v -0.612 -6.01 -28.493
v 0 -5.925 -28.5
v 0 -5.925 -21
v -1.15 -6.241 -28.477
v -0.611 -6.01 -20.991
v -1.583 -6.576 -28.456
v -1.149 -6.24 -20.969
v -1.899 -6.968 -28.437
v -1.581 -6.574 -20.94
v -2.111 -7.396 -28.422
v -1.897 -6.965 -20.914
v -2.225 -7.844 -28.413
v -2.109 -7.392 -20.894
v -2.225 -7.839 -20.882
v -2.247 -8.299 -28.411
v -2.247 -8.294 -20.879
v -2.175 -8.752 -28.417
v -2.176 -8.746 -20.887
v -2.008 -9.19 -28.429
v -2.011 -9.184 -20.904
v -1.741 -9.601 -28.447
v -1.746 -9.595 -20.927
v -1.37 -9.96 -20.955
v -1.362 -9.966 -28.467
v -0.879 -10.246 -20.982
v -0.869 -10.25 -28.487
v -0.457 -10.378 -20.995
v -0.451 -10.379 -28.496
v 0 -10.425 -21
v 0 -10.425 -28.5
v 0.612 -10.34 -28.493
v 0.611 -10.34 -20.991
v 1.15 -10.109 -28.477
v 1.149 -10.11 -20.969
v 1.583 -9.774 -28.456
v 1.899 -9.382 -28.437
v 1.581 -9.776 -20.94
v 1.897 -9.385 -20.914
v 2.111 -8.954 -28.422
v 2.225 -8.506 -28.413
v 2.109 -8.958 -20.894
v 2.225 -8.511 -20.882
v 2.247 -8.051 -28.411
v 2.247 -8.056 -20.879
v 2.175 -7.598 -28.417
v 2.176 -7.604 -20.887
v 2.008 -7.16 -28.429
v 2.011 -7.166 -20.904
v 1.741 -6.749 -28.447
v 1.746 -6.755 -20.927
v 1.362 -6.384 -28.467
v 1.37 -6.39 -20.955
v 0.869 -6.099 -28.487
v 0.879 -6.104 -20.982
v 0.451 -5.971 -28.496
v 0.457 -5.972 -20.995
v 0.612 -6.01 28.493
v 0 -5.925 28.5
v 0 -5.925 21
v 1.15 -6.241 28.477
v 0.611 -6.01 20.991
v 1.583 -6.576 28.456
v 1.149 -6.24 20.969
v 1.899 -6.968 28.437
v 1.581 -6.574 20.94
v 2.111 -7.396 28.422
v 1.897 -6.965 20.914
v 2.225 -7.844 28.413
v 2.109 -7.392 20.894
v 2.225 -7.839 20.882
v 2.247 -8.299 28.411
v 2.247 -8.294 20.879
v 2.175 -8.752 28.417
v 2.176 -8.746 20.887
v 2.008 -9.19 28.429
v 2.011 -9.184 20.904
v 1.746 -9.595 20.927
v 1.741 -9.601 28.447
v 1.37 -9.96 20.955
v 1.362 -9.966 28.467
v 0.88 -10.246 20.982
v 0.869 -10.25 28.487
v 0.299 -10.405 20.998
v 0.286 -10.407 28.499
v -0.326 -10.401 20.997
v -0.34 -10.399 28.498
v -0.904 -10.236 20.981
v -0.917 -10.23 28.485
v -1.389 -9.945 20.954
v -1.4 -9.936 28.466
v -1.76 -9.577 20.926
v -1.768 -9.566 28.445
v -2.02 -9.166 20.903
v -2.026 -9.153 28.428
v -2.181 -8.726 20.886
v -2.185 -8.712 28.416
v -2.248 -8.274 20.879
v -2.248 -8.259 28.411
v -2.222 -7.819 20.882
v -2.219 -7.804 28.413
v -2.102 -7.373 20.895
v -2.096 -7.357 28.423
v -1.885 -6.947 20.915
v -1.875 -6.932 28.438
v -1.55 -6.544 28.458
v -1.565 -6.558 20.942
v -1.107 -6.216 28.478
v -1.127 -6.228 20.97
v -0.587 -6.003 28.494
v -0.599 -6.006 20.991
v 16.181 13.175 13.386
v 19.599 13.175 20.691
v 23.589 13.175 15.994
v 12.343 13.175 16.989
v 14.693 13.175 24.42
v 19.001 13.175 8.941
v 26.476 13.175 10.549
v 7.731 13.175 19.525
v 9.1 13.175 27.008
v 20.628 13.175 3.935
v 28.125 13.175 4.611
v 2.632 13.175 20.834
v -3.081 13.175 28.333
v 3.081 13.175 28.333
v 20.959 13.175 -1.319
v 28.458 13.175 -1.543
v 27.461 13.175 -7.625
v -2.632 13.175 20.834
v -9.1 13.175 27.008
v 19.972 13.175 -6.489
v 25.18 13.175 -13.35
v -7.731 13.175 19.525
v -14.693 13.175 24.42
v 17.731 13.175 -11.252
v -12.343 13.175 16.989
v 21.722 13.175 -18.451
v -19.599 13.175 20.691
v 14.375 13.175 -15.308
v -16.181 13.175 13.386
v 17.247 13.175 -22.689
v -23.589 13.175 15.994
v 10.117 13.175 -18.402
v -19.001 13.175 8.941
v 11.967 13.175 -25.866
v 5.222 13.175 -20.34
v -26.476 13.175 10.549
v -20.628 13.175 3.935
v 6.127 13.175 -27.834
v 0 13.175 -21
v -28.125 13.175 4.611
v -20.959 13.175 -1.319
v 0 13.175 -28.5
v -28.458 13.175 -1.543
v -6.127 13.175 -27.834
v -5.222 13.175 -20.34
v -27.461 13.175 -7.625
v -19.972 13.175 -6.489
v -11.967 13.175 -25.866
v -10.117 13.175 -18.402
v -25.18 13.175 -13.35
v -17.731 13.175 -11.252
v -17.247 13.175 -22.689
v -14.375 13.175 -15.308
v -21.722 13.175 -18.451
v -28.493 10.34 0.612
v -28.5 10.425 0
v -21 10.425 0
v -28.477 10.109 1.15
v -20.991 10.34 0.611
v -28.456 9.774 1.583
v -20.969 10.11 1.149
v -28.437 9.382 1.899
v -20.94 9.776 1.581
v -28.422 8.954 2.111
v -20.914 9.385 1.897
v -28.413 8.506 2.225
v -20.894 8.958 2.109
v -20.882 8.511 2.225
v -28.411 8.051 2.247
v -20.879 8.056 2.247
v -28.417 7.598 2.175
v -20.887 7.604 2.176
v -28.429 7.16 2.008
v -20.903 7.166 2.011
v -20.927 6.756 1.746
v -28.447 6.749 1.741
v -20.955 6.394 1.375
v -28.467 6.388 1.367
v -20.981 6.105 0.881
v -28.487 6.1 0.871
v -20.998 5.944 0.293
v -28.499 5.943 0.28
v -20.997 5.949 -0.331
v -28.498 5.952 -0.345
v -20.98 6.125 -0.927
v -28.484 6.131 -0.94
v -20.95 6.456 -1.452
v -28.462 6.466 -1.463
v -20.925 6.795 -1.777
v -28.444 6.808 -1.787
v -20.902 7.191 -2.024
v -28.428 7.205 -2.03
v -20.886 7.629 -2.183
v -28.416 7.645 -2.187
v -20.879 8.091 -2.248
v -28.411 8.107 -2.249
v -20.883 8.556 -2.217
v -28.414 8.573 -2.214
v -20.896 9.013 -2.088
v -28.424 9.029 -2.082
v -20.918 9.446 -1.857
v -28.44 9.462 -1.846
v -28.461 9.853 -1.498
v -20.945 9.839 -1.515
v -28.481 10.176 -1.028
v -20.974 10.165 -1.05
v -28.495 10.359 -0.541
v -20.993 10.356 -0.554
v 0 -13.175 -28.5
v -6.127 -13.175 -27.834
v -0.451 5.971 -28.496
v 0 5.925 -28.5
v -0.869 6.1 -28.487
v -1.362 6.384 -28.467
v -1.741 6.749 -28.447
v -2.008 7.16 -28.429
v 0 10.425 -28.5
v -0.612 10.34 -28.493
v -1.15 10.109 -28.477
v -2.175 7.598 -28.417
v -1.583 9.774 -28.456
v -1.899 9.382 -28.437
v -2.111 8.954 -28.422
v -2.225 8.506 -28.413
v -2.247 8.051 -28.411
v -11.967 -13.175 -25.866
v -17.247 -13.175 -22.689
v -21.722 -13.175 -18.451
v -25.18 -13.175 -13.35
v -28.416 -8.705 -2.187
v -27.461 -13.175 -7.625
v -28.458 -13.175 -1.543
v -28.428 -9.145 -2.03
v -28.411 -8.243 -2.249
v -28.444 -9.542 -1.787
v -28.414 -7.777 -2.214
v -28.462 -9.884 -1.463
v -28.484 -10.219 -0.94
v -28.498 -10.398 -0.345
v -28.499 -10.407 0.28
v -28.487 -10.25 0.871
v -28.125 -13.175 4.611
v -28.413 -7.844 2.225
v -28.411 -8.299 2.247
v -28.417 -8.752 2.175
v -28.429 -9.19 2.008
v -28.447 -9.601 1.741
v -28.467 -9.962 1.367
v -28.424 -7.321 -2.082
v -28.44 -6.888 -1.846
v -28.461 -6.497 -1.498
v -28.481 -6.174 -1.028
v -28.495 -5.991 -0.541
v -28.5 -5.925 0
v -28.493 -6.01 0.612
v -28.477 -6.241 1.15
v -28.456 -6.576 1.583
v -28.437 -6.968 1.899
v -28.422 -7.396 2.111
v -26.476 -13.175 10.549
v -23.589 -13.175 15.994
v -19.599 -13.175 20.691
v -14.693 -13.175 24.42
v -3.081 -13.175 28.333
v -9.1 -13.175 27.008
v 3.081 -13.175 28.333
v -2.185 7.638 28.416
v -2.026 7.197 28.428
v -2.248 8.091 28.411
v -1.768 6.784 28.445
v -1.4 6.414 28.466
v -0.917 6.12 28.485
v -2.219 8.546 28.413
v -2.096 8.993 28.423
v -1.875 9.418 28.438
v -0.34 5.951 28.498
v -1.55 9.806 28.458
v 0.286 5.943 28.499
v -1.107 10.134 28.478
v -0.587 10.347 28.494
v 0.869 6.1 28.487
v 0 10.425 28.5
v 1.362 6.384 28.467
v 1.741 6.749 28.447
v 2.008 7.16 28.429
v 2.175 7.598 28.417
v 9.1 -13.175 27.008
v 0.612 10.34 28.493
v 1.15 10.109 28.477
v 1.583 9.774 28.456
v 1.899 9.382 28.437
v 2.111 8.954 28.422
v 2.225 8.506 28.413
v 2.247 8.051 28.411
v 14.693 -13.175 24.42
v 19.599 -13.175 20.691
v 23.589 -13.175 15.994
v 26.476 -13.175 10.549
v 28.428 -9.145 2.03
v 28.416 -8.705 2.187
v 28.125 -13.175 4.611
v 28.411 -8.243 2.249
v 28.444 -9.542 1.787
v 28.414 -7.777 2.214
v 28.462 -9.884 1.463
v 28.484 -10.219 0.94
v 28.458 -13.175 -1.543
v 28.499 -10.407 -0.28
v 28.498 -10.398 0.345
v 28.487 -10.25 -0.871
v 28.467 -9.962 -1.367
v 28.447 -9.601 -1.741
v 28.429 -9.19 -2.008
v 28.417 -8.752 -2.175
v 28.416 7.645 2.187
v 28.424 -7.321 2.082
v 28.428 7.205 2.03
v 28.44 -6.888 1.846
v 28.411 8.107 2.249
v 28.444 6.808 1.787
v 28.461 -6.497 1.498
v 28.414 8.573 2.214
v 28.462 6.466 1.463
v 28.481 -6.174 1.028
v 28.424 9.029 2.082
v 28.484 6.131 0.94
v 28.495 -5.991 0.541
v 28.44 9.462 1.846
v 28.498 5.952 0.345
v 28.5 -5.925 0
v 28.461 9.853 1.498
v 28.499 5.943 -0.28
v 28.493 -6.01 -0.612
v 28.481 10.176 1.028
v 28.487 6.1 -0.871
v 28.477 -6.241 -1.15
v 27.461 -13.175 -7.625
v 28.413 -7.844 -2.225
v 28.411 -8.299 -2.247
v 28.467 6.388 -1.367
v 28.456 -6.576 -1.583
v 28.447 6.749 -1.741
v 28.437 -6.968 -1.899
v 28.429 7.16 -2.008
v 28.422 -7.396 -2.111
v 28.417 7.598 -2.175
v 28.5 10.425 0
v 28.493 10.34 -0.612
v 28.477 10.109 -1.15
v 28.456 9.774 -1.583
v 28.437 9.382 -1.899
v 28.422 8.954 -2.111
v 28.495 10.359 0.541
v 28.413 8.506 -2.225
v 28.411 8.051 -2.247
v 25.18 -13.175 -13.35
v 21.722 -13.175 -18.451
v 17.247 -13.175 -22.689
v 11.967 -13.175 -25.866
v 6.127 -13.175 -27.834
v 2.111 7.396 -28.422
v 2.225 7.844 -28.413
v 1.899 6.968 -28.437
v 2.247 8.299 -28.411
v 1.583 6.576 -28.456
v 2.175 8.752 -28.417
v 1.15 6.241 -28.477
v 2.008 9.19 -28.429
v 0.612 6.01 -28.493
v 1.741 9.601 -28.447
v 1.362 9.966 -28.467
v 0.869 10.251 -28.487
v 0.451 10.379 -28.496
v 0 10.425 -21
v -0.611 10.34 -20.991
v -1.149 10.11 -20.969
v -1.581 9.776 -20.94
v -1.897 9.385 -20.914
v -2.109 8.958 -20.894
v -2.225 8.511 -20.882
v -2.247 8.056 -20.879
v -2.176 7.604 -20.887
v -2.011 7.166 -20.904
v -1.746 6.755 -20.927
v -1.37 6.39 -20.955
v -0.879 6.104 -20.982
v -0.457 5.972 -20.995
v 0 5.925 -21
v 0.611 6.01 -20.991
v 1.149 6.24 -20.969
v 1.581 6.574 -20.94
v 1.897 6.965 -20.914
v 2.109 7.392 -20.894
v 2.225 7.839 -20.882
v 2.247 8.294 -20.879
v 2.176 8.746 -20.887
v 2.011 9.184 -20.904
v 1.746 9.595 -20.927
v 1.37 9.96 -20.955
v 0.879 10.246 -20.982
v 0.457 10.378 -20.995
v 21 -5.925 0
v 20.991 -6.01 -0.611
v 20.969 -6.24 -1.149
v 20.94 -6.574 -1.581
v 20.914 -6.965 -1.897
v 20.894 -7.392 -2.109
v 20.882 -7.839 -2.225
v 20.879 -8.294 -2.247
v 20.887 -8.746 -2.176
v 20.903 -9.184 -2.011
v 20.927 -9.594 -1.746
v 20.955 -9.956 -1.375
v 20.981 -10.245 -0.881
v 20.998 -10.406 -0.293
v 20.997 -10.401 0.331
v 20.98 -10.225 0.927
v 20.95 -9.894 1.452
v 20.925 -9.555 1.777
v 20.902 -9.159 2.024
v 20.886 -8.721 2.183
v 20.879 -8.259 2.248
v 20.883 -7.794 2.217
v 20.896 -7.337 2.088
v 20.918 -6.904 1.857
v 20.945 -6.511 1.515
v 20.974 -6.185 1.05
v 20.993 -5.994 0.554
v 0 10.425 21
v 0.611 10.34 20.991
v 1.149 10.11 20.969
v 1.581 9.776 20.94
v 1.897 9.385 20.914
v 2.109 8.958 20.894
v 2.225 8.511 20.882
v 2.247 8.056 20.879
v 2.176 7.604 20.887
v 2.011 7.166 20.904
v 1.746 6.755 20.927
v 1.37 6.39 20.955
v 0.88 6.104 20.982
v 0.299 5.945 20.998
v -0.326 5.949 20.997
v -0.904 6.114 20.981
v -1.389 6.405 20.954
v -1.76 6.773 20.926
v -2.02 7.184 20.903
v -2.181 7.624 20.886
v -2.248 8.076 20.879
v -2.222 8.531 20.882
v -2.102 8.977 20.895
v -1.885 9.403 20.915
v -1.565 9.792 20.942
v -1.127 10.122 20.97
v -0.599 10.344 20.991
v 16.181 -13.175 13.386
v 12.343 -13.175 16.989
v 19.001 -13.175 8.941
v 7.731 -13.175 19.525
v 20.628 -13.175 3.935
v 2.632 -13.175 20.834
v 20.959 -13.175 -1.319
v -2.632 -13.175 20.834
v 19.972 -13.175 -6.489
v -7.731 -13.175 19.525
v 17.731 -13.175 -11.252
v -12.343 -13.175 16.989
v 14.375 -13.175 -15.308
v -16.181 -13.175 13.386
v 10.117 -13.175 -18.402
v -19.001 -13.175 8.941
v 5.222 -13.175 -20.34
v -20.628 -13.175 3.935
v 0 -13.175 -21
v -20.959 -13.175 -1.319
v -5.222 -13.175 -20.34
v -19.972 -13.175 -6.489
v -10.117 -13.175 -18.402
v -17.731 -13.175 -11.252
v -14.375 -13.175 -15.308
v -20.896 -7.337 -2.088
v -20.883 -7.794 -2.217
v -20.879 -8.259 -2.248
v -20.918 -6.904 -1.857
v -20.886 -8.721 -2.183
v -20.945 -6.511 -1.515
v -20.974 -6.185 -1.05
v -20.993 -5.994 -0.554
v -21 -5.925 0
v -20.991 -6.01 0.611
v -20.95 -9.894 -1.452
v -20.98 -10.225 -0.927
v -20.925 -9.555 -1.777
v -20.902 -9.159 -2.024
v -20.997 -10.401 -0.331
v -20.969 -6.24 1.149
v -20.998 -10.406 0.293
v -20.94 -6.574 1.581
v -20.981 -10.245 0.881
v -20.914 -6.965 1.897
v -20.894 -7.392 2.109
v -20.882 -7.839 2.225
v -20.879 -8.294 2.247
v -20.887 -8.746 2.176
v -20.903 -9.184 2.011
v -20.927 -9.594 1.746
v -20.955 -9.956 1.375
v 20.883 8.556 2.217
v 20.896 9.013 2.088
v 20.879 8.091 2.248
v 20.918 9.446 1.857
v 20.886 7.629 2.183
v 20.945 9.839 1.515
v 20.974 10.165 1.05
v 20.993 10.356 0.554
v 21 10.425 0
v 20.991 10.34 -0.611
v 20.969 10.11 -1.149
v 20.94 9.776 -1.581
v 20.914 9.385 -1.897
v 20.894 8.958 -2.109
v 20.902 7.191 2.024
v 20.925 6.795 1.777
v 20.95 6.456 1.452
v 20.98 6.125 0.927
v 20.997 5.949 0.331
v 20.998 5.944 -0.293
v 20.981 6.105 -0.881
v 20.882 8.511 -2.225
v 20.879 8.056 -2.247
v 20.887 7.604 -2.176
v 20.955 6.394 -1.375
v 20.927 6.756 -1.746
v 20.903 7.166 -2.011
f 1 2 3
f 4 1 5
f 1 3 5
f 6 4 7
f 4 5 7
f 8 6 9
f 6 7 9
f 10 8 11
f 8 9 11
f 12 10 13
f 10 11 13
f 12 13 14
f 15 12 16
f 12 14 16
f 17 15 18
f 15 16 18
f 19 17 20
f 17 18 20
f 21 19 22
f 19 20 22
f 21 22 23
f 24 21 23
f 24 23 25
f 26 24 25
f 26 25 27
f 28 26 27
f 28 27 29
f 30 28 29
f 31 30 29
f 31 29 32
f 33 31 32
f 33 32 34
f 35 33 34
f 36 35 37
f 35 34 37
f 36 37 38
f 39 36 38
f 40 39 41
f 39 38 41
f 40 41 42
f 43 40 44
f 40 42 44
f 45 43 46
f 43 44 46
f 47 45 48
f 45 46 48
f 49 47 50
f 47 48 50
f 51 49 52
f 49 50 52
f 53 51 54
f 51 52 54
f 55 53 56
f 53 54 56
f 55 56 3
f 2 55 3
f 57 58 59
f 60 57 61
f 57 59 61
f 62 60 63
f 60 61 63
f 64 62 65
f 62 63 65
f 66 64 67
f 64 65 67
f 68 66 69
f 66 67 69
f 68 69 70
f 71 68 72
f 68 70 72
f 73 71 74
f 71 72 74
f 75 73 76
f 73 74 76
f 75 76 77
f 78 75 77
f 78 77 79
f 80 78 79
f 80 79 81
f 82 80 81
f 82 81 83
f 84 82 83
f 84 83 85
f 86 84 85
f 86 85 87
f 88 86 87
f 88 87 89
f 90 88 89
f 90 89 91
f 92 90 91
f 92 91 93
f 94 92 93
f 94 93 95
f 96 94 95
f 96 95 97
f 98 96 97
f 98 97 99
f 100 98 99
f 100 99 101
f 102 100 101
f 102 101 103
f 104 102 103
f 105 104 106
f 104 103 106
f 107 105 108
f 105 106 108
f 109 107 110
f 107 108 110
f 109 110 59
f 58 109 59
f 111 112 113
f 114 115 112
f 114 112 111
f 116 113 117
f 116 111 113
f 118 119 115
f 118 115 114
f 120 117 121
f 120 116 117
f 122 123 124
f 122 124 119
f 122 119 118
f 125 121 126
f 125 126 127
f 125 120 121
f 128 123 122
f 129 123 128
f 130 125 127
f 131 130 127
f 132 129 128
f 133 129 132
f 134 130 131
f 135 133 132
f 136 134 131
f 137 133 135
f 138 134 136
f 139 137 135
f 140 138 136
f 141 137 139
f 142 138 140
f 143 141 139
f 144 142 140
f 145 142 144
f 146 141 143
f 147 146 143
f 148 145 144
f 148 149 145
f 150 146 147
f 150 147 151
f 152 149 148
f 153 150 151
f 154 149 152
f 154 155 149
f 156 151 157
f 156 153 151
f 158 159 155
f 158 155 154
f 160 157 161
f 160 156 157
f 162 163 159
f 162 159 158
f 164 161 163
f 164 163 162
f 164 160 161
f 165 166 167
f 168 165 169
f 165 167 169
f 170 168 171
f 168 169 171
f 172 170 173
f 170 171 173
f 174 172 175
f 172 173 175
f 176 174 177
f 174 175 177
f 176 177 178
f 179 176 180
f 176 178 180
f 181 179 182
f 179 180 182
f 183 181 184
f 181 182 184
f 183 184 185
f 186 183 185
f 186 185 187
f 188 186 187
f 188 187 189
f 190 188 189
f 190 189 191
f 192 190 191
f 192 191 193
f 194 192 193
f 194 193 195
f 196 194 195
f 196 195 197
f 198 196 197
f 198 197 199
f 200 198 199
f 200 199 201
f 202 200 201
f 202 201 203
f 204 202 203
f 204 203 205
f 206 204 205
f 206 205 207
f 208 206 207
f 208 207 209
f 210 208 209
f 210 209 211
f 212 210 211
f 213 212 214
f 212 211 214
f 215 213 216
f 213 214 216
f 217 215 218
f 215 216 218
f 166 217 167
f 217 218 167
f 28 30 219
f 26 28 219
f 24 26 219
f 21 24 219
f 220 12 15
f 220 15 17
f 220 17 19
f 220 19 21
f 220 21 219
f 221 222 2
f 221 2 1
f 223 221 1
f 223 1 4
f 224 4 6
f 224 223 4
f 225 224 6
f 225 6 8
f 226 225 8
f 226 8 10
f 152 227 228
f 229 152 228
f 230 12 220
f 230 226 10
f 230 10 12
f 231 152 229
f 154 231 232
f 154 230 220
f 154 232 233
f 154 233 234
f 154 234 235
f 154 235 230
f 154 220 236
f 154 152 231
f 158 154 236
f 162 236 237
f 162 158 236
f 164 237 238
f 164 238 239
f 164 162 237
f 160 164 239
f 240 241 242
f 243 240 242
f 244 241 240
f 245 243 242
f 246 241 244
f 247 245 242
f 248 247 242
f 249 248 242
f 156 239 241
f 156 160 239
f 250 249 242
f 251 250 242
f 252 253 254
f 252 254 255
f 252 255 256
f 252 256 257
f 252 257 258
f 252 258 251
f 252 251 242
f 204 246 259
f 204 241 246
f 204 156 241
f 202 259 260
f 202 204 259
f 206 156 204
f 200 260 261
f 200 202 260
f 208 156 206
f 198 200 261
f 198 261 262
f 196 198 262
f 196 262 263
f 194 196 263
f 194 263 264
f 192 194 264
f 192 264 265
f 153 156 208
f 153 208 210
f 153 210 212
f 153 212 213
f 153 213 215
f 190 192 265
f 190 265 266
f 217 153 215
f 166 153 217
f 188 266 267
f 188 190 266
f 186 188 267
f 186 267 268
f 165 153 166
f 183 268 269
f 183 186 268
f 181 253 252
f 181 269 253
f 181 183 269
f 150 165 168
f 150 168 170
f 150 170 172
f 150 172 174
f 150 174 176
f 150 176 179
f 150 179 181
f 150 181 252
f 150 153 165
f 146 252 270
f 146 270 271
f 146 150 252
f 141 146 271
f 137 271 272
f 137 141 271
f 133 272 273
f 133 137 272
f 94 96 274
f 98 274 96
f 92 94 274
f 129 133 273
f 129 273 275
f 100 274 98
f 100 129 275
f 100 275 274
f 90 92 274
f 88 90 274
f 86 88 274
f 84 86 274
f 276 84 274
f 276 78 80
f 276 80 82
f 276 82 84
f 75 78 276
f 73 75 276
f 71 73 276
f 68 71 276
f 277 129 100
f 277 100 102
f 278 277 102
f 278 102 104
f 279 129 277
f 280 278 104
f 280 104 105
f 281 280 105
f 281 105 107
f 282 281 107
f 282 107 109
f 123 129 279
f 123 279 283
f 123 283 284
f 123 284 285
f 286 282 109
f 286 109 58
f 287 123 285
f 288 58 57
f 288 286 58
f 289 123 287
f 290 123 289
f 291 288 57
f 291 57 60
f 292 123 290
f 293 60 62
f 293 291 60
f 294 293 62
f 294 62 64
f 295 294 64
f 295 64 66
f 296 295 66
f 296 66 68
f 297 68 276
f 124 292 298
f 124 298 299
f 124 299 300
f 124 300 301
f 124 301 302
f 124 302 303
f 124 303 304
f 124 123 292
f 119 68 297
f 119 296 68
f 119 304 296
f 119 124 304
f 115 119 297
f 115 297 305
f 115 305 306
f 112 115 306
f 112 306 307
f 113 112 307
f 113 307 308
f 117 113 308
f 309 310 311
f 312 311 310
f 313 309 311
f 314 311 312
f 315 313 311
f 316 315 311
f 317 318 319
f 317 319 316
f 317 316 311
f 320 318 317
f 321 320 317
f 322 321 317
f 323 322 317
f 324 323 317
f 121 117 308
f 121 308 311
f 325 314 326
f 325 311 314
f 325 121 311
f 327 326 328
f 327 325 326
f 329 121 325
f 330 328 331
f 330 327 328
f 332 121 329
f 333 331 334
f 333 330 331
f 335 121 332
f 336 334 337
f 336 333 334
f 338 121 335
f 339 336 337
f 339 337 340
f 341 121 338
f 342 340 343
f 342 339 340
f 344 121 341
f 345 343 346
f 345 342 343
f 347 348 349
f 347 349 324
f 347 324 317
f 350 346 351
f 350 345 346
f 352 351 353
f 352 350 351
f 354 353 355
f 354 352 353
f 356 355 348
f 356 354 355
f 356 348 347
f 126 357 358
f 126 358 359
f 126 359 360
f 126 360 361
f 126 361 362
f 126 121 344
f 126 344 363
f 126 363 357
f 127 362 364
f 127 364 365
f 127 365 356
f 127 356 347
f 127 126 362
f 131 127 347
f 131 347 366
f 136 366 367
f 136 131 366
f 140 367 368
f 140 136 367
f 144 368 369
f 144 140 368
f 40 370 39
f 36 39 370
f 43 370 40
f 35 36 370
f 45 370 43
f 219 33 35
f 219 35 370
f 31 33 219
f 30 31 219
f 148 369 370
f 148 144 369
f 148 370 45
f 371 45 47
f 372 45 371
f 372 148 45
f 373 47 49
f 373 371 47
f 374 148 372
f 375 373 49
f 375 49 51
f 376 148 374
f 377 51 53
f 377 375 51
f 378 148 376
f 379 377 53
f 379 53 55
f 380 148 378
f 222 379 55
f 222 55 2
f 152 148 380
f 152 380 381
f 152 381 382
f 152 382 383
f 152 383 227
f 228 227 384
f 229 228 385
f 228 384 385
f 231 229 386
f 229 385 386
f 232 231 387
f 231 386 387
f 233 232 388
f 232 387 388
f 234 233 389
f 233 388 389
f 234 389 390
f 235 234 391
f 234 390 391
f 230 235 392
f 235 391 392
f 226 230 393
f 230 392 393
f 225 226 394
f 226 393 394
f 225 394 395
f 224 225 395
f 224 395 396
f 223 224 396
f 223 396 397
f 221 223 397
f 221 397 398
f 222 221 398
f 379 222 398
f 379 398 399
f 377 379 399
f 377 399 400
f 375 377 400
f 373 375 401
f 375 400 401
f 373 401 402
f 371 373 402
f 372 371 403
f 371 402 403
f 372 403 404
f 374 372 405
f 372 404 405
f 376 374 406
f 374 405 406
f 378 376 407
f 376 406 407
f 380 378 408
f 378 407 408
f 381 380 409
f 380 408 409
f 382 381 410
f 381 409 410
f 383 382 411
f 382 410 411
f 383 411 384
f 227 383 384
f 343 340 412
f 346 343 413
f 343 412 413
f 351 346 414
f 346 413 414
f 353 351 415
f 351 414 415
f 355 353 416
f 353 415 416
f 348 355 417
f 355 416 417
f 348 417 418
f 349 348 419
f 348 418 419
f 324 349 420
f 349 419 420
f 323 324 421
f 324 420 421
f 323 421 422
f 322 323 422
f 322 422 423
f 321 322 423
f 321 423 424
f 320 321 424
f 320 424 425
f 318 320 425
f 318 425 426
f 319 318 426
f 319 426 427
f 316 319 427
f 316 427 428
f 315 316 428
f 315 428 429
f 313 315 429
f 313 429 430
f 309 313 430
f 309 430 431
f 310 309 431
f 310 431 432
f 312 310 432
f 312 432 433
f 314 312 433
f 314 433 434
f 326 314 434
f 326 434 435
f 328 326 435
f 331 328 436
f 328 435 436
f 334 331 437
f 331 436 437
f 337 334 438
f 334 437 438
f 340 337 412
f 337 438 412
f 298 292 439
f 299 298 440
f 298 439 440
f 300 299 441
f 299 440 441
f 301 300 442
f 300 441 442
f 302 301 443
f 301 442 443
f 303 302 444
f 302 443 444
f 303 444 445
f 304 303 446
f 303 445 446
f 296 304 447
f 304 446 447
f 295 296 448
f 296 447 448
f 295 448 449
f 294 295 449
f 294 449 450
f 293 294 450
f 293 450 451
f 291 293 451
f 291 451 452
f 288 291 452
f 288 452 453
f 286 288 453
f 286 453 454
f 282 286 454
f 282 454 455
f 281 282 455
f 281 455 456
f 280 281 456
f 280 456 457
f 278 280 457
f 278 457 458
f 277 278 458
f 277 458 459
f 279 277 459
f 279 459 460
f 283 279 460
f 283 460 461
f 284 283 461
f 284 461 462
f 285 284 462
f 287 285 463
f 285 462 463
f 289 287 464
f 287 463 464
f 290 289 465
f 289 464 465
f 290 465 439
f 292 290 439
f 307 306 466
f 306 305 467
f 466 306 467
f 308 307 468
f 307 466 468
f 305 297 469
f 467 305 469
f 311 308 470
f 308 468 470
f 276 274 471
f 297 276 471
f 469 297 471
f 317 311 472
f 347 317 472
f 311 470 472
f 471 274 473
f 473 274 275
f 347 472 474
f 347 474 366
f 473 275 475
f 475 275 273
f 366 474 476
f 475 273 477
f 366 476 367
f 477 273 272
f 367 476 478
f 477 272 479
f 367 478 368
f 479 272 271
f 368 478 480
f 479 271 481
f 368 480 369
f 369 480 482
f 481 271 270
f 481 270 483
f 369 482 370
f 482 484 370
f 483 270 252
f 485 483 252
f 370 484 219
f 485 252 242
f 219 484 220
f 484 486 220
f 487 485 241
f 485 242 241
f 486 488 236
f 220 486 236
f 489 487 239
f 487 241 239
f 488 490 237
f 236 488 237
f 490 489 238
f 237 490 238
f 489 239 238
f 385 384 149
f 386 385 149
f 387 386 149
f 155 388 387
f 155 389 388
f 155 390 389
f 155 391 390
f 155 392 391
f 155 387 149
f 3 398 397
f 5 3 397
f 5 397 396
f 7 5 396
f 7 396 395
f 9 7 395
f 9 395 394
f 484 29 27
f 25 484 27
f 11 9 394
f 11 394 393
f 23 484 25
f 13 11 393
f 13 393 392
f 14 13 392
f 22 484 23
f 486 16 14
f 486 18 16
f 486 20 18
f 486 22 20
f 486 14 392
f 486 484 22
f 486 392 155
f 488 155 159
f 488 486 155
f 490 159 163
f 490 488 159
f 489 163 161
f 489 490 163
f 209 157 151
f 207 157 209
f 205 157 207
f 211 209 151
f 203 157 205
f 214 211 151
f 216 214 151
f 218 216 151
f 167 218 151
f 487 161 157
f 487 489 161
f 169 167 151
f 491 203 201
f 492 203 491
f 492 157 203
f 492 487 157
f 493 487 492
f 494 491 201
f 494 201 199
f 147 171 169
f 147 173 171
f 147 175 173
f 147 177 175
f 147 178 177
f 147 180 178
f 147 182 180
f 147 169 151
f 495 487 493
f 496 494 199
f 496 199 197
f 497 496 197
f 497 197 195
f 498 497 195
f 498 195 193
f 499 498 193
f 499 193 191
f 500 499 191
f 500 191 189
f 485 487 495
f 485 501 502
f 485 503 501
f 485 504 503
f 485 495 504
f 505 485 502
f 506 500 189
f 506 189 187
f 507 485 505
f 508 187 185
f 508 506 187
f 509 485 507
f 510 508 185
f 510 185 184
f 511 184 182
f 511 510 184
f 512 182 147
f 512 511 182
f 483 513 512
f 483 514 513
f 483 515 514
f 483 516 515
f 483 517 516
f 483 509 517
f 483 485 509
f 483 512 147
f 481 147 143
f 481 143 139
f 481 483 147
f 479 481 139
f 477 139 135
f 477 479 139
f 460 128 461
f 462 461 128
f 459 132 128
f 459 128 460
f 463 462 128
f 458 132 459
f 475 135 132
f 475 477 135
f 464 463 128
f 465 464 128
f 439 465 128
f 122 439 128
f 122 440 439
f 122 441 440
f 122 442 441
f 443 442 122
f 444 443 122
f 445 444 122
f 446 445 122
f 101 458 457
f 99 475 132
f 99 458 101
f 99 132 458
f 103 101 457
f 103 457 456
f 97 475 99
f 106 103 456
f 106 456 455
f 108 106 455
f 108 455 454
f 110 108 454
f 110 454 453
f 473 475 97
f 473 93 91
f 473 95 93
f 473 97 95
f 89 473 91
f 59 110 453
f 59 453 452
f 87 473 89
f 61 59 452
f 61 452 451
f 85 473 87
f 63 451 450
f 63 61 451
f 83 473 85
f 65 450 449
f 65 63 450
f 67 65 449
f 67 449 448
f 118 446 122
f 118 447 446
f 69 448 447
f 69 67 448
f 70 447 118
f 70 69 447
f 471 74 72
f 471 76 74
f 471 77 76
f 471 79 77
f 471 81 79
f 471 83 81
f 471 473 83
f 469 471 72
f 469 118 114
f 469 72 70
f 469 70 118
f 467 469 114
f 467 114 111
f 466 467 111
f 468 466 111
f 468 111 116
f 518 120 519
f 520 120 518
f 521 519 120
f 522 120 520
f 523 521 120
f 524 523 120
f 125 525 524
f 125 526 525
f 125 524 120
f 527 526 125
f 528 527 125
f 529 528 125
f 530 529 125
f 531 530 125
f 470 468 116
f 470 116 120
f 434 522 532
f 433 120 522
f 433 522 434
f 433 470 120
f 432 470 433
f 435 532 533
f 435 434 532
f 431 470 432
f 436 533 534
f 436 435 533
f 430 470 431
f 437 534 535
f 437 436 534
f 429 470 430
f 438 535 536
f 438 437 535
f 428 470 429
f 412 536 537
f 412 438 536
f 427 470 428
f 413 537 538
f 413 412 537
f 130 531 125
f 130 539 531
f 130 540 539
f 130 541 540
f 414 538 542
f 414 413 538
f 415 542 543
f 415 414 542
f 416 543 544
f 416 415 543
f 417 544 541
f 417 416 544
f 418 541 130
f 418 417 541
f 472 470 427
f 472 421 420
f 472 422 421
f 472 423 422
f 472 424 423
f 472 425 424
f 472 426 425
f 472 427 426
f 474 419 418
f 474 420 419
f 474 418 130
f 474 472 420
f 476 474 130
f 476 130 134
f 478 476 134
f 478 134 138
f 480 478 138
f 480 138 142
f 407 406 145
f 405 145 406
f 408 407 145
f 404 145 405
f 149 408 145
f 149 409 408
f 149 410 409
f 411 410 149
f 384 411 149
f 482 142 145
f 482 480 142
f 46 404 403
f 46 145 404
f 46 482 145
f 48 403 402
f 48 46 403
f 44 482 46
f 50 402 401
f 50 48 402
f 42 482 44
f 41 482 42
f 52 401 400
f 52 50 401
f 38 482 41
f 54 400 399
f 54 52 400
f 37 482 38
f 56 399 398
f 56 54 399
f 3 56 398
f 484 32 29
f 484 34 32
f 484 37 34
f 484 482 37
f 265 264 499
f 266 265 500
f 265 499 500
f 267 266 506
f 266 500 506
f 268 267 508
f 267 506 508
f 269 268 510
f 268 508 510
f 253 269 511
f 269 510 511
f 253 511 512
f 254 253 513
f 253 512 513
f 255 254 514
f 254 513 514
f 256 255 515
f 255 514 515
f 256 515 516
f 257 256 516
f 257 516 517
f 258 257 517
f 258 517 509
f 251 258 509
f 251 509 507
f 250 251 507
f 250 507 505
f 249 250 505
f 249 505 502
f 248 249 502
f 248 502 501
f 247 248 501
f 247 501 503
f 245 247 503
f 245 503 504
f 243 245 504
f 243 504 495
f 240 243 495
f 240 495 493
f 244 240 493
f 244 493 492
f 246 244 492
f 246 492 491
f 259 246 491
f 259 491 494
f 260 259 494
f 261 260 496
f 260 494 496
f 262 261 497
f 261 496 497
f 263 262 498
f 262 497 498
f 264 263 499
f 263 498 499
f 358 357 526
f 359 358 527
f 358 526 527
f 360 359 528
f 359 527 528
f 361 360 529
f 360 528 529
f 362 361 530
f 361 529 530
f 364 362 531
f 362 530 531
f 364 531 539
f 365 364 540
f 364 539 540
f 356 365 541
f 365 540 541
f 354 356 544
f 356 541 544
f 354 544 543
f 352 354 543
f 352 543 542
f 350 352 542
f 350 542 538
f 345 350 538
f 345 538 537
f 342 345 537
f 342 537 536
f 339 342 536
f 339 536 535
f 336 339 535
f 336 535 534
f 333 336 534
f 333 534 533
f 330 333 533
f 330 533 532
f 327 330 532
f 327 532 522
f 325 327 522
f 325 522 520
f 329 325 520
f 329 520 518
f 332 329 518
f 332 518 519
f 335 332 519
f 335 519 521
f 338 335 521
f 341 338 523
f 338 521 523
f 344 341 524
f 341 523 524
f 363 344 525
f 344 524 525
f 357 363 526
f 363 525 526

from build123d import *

# Parameters (mm, degrees)
SKETCH1_R           = 28.5
SKETCH1_R_2         = 21
BOSS_EXTRUDE1_DEPTH = 13.175
SKETCH2_R           = 2.25
CUT_EXTRUDE1_DEPTH  = 43.403780787
CIRPATTERN1_COUNT   = 4


with BuildPart() as part:
    # Sketch1 → Boss-Extrude1 (new, symmetric)
    with BuildSketch(Plane(origin=(0, 0, 0), x_dir=(1, 0, 0), z_dir=(0, 1, 0))):
        with Locations(Location((0, 0, 0), (0, 0, 90))):
            Circle(SKETCH1_R)
        with Locations(Location((0, 0, 0), (0, 0, 90))):
            Circle(SKETCH1_R_2, mode=Mode.SUBTRACT)
    extrude(amount=BOSS_EXTRUDE1_DEPTH, both=True)

    # Sketch2 → Cut-Extrude1 (cut, through all)
    with BuildSketch(Plane.XY):
        with Locations(Location((0, 8.175, 0), (0, 0, 90))):
            Circle(SKETCH2_R)
        with Locations(Location((0, -8.175, 0), (0, 0, 90))):
            Circle(SKETCH2_R)
    cut_extrude1 = extrude(amount=-CUT_EXTRUDE1_DEPTH, mode=Mode.SUBTRACT)

    # CirPattern1: Cut-Extrude1 ×4 about axis
    cirpattern1_axis = Axis((0, 13.175, 0), (0, -1, 0))
    for i in range(1, CIRPATTERN1_COUNT):
        add(cut_extrude1.rotate(cirpattern1_axis, i * 360 / CIRPATTERN1_COUNT), mode=Mode.SUBTRACT)


solid = part.part
